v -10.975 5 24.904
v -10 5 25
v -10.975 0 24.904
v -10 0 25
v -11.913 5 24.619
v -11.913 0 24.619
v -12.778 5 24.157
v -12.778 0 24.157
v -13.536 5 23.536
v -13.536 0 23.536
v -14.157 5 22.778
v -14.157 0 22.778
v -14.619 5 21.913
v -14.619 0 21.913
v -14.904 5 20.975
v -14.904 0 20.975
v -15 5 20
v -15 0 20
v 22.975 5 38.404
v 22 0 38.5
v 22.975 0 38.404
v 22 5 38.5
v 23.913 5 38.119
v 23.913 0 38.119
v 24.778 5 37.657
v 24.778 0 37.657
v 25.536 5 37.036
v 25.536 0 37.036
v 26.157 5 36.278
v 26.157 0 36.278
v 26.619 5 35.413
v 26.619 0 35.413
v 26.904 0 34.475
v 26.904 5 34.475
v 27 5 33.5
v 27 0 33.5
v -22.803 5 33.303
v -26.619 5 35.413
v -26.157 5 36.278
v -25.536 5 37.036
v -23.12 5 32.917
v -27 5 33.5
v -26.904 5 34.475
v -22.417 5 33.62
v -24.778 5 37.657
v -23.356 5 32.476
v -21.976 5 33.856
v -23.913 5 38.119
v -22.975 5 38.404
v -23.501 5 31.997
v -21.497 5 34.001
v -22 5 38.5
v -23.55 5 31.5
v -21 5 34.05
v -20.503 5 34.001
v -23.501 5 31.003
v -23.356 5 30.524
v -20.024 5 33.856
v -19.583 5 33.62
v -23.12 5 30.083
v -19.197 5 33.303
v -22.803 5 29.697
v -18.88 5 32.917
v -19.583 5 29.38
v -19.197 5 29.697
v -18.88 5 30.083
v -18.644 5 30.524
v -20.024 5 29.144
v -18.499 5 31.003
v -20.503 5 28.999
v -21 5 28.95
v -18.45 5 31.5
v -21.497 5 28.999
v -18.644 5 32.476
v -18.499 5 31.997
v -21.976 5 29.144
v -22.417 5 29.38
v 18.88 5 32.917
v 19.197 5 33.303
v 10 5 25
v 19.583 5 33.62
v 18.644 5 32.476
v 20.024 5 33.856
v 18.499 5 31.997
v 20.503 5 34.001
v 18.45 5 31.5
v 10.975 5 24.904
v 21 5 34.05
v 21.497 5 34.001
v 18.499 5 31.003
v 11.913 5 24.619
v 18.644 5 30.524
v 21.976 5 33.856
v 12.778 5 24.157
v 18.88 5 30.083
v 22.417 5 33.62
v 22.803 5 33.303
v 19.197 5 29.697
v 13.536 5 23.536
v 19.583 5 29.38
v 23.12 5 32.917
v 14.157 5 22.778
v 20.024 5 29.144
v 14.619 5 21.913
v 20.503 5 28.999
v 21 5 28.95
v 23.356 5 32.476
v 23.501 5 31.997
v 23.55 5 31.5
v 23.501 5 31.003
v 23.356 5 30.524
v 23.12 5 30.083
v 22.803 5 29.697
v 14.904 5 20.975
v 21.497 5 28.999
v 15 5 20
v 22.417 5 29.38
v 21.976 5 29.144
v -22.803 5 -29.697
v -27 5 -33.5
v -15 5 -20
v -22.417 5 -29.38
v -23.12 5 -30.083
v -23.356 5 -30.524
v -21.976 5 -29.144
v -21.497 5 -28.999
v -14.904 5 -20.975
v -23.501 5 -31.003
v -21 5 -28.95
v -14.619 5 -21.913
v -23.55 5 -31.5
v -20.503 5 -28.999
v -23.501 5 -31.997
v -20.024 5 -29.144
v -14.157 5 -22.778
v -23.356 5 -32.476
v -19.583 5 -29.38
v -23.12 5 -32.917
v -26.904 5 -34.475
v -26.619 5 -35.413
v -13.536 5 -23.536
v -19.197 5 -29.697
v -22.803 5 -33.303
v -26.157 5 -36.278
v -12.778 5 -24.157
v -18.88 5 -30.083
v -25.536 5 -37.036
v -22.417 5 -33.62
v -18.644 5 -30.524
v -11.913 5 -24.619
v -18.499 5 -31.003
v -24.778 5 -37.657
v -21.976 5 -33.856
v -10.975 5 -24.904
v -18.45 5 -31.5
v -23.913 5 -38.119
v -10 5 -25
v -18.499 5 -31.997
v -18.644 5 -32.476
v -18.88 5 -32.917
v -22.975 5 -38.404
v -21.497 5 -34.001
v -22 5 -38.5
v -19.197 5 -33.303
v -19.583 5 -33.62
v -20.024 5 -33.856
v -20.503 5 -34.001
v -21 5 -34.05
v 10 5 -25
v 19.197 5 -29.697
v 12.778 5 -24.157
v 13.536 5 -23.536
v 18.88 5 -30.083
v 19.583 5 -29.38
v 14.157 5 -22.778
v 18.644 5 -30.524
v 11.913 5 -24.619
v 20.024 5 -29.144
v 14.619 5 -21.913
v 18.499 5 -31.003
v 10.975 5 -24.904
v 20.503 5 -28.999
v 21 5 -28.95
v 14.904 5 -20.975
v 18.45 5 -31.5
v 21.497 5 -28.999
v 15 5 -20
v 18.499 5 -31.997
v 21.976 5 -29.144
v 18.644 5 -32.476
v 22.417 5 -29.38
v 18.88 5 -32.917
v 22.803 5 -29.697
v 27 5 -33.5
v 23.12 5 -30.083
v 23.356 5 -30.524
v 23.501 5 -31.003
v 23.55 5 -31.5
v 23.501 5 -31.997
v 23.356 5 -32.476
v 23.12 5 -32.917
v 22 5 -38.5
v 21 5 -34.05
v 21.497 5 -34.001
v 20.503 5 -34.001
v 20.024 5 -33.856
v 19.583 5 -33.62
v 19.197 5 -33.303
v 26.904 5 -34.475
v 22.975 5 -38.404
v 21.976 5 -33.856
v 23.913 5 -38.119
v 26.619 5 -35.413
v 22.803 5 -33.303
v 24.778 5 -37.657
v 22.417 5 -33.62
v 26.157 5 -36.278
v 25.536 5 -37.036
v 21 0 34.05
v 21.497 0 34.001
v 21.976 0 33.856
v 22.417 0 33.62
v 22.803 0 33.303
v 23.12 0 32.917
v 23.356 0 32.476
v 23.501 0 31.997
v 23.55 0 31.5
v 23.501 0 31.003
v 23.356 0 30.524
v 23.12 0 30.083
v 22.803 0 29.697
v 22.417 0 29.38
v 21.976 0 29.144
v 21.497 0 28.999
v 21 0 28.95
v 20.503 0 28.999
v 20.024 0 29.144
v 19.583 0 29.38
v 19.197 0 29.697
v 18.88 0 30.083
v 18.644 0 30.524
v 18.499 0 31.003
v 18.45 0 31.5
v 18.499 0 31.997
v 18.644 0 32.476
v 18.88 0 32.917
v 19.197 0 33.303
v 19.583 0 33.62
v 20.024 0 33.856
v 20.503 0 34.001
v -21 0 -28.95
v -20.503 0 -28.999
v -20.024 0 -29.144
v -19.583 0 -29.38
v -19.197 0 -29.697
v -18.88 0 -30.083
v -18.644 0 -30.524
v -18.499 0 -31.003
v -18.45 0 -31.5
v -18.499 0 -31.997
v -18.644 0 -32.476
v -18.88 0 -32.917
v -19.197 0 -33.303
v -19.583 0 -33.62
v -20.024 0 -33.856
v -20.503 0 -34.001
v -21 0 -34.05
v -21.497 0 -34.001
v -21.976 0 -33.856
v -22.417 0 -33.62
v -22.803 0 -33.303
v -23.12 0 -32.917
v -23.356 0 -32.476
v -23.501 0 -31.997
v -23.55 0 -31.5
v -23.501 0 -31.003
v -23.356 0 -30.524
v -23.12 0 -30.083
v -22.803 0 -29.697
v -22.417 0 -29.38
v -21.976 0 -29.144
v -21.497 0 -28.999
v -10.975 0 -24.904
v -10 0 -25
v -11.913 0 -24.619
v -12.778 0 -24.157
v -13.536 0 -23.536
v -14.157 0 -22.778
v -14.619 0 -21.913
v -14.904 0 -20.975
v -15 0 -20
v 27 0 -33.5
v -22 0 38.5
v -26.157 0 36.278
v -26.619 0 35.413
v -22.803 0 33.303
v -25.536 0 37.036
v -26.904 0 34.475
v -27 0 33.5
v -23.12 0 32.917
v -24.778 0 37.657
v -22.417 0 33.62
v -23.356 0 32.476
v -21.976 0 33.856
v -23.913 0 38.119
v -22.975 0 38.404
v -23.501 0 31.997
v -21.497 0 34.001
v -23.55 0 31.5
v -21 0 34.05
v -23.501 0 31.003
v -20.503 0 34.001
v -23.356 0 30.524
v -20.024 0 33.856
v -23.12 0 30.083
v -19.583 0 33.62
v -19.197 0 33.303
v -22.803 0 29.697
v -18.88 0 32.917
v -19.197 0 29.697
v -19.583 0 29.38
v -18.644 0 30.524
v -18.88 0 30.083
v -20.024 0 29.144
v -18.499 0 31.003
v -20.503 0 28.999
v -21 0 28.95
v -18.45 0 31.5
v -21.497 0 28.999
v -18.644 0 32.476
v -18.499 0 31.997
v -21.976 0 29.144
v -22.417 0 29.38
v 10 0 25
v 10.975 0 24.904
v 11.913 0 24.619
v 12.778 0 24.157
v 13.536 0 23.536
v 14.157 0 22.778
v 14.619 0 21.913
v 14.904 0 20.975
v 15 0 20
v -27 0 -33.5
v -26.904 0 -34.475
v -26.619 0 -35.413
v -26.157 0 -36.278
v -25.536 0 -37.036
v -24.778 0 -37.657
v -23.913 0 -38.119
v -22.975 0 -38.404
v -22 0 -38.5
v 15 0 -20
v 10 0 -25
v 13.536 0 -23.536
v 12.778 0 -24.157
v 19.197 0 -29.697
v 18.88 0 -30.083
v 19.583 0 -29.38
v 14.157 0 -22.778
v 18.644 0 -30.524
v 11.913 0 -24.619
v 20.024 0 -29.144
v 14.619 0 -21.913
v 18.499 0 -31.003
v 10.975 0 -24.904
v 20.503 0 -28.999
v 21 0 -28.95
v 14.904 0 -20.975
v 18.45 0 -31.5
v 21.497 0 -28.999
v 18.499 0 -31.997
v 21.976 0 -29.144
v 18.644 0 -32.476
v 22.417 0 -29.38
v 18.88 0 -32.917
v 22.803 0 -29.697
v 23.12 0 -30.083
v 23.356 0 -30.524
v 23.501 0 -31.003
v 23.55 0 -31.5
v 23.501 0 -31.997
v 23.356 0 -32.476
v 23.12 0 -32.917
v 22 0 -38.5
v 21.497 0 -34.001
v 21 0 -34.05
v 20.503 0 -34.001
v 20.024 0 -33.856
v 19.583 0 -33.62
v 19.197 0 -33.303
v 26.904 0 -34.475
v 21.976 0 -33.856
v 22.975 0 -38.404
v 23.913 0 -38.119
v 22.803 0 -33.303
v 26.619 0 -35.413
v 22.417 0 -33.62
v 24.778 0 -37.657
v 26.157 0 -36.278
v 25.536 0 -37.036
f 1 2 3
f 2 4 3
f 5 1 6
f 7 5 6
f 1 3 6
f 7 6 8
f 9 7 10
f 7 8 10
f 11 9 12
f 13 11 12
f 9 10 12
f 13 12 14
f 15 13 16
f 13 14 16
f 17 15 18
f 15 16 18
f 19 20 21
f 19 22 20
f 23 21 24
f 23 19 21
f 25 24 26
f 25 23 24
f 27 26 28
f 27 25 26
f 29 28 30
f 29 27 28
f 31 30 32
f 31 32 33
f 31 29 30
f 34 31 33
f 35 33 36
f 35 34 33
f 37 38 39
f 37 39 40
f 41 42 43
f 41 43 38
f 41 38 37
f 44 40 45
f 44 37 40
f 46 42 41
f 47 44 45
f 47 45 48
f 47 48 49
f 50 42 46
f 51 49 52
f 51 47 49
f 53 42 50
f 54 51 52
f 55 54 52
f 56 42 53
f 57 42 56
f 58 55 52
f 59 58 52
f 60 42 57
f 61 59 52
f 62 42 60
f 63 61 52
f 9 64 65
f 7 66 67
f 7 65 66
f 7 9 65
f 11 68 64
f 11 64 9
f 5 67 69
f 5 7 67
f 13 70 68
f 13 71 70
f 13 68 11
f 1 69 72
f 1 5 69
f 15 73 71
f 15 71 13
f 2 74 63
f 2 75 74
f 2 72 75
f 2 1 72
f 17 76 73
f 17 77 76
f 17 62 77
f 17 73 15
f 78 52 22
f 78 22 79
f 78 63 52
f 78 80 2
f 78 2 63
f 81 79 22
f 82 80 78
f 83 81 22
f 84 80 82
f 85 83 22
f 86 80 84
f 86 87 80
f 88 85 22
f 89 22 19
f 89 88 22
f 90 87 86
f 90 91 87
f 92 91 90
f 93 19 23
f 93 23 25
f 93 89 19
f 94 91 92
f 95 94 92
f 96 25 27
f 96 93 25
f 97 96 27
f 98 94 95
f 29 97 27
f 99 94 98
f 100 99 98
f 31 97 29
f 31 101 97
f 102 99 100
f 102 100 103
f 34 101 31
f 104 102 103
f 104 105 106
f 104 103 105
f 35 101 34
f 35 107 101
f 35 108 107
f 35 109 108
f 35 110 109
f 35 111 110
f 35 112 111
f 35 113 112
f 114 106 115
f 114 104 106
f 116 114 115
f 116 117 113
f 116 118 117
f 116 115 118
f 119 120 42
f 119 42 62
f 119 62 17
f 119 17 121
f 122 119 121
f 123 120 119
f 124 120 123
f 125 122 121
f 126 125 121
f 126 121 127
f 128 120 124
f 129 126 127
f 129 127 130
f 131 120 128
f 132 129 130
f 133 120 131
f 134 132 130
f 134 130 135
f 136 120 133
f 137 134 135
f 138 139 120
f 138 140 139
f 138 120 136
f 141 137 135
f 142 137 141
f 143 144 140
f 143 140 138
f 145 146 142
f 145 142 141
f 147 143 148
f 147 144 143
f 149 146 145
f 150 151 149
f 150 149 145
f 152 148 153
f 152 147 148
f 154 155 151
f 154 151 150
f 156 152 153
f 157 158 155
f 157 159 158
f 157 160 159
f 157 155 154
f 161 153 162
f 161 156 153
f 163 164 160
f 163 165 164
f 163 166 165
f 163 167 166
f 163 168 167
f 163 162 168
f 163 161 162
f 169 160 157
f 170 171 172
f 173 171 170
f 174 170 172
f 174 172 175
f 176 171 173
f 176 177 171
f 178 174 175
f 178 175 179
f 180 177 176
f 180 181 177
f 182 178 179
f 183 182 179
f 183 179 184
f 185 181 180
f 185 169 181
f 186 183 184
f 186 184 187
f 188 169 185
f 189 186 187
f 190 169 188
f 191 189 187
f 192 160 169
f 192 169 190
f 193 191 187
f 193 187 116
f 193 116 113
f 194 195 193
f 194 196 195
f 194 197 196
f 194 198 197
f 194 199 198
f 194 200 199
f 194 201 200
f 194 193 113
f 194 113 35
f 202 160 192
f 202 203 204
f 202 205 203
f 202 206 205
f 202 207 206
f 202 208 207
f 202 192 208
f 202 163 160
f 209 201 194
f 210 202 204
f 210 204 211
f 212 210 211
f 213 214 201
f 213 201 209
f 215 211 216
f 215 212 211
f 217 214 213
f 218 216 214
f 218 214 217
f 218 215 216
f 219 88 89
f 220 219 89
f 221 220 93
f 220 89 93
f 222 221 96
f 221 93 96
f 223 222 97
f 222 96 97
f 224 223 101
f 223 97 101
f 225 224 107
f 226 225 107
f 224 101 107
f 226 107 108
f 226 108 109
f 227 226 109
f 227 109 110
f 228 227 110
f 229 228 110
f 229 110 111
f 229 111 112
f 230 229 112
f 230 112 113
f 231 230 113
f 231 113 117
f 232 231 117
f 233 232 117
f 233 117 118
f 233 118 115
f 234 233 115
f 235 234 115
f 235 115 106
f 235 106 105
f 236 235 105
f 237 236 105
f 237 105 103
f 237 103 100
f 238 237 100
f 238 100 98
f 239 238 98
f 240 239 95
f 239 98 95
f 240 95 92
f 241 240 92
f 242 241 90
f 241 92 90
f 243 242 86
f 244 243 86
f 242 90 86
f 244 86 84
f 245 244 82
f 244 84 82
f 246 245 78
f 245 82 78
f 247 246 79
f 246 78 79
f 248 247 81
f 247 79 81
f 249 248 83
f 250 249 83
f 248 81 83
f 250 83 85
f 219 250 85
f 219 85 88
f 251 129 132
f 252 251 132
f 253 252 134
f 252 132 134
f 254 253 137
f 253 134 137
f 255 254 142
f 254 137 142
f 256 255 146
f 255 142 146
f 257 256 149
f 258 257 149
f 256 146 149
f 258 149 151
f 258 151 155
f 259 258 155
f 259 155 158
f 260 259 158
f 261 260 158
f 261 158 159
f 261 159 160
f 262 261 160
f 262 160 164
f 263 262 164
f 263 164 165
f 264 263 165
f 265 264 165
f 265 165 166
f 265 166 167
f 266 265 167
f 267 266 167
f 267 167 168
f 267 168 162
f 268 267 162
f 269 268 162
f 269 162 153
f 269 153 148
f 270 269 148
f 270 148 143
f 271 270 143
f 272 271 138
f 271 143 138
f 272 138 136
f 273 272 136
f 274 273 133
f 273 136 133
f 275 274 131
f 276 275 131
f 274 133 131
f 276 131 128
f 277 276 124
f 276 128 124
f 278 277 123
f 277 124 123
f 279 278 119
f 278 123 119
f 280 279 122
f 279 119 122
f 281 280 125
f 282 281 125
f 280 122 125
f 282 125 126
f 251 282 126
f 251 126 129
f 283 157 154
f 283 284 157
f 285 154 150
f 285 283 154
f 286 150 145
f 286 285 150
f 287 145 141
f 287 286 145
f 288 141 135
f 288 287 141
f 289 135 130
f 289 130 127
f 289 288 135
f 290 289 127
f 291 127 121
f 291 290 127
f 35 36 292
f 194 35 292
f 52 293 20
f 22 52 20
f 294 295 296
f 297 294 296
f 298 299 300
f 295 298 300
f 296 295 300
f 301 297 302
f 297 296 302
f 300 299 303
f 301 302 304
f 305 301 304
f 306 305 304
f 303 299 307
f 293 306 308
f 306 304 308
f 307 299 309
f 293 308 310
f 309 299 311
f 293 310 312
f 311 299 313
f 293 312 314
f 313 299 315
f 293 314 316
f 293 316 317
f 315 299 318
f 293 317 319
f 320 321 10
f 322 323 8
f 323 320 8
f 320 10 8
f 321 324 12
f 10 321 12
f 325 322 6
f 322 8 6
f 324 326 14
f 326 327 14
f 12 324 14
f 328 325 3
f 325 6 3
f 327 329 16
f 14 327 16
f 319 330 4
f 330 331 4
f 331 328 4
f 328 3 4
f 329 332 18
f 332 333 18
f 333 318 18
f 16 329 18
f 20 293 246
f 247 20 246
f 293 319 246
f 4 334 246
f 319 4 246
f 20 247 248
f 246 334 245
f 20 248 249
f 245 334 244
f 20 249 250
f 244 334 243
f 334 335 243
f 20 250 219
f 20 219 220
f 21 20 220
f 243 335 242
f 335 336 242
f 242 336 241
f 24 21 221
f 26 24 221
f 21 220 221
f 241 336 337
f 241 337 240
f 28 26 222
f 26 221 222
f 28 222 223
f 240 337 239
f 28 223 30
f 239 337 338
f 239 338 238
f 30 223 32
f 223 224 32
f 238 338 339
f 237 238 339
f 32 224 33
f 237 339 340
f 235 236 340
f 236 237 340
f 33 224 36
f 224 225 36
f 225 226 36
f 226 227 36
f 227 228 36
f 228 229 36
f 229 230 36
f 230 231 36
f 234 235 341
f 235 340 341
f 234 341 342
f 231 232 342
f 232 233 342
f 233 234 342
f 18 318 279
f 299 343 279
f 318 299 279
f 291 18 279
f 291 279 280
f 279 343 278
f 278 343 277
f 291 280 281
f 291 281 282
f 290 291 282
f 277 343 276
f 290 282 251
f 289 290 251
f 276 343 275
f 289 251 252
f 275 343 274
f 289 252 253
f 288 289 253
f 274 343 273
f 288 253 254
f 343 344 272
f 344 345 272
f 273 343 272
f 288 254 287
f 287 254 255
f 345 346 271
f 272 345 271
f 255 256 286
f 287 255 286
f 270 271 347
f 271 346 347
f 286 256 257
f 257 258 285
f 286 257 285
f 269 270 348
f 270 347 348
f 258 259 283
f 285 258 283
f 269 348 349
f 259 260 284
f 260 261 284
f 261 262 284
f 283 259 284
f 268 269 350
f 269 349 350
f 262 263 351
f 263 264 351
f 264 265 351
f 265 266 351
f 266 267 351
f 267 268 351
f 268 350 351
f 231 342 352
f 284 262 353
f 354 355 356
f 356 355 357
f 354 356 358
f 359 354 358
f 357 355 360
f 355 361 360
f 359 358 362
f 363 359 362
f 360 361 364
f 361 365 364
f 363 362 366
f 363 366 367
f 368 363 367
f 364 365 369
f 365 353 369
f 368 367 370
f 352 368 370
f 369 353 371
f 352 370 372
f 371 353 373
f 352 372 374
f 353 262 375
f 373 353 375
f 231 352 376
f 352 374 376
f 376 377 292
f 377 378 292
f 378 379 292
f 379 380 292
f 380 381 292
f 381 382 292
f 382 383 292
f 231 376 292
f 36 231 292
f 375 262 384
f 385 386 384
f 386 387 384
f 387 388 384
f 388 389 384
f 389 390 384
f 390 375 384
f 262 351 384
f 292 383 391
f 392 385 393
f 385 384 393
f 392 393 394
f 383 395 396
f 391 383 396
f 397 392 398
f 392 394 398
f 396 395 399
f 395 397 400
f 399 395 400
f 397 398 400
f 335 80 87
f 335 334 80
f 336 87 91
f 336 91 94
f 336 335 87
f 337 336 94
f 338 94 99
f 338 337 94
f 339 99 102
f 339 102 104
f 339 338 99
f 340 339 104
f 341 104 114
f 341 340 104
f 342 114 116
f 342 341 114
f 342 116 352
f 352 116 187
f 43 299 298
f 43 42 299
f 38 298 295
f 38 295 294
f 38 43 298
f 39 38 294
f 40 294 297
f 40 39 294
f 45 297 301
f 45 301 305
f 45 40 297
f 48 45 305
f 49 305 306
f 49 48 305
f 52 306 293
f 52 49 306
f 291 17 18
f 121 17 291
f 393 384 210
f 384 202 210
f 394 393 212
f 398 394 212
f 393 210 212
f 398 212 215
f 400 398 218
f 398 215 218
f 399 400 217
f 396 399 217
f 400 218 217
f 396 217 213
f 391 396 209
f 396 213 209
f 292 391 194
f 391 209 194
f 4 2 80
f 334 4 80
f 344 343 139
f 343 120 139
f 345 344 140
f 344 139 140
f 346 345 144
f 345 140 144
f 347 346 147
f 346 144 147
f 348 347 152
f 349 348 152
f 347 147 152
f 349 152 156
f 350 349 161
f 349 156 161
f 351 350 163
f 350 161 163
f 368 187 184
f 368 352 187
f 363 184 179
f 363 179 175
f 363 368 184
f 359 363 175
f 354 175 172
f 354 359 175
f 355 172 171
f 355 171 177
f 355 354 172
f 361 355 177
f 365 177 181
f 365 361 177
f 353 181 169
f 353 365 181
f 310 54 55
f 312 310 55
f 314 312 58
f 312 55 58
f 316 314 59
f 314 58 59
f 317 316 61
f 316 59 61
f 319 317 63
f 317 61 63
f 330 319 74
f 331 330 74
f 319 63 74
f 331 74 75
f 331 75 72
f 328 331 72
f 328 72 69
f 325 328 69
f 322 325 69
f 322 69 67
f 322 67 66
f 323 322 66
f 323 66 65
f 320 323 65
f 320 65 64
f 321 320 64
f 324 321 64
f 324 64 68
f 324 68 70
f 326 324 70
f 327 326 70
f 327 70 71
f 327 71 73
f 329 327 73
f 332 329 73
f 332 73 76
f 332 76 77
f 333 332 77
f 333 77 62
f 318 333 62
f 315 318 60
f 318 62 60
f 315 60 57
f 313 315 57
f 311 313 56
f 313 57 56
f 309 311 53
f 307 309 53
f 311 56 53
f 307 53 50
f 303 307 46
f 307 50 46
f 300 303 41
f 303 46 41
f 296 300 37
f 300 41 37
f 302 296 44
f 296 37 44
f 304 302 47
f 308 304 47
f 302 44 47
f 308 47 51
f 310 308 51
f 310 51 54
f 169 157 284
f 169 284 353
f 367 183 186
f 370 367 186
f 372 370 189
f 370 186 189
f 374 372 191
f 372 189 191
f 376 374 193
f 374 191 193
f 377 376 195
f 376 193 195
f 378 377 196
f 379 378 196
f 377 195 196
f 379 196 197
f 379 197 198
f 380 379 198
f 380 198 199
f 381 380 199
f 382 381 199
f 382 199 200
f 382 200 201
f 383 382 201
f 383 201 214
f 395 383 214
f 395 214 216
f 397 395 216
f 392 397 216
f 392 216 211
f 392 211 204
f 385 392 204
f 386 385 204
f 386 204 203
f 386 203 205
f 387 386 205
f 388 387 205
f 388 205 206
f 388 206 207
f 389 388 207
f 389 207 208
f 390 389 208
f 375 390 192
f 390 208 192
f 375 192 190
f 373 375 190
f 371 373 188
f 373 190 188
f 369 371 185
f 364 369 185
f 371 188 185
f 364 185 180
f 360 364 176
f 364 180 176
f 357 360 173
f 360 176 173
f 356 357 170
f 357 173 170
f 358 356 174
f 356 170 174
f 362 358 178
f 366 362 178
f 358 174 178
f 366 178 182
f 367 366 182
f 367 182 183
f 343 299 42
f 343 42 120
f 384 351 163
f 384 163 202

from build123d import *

# Parameters (mm, degrees)
SKETCH1_W            = 54
SKETCH1_H            = 77
BOSS_EXTRUDE1_DEPTH  = 5
SKETCH2_R            = 2.55
CUT_EXTRUDE1_DEPTH   = 48.289005065
LPATTERN1_COUNT      = 2
LPATTERN1_PITCH      = 42
LPATTERN1_COUNT_DIR2 = 2
LPATTERN1_PITCH_DIR2 = 63
SKETCH3_W            = 30
SKETCH3_H            = 50
CUT_EXTRUDE2_DEPTH   = 48.289005065
FILLET1_R            = 5


with BuildPart() as part:
    # Sketch1 → Boss-Extrude1 (new body)
    with BuildSketch(Plane(origin=(0, 0, 0), x_dir=(1, 0, 0), z_dir=(0, 1, 0))):
        Rectangle(SKETCH1_W, SKETCH1_H)
    extrude(amount=BOSS_EXTRUDE1_DEPTH)

    # Sketch2 → Cut-Extrude1 (cut, through all)
    with BuildSketch(Plane(origin=(0, 5, 0), x_dir=(1, 0, 0), z_dir=(0, 1, 0))):
        with Locations(Location((-21, 31.5, 0), (0, 0, 270))):
            Circle(SKETCH2_R)
    cut_extrude1 = extrude(amount=-CUT_EXTRUDE1_DEPTH, mode=Mode.SUBTRACT)

    # LPattern1: Cut-Extrude1 2 × 2
    with Locations(*[(i * LPATTERN1_PITCH, 0, j * LPATTERN1_PITCH_DIR2) for i in range(LPATTERN1_COUNT) for j in range(LPATTERN1_COUNT_DIR2) if (i, j) != (0, 0)]):
        add(cut_extrude1, mode=Mode.SUBTRACT)

    # Sketch3 → Cut-Extrude2 (cut, through all)
    with BuildSketch(Plane(origin=(0, 5, 0), x_dir=(1, 0, 0), z_dir=(0, 1, 0))):
        Rectangle(SKETCH3_W, SKETCH3_H)
    extrude(amount=-CUT_EXTRUDE2_DEPTH, mode=Mode.SUBTRACT)

    # Fillet1
    fillet1_edges = [part.edges().sort_by_distance(p)[0] for p in [
        (15, 2.5, -25),
        (15, 2.5, 25),
        (-15, 2.5, 25),
        (-15, 2.5, -25),
        (27, 2.5, 38.5),
        (-27, 2.5, 38.5),
        (-27, 2.5, -38.5),
        (27, 2.5, -38.5),
    ]]
    fillet(fillet1_edges, radius=FILLET1_R)


solid = part.part
